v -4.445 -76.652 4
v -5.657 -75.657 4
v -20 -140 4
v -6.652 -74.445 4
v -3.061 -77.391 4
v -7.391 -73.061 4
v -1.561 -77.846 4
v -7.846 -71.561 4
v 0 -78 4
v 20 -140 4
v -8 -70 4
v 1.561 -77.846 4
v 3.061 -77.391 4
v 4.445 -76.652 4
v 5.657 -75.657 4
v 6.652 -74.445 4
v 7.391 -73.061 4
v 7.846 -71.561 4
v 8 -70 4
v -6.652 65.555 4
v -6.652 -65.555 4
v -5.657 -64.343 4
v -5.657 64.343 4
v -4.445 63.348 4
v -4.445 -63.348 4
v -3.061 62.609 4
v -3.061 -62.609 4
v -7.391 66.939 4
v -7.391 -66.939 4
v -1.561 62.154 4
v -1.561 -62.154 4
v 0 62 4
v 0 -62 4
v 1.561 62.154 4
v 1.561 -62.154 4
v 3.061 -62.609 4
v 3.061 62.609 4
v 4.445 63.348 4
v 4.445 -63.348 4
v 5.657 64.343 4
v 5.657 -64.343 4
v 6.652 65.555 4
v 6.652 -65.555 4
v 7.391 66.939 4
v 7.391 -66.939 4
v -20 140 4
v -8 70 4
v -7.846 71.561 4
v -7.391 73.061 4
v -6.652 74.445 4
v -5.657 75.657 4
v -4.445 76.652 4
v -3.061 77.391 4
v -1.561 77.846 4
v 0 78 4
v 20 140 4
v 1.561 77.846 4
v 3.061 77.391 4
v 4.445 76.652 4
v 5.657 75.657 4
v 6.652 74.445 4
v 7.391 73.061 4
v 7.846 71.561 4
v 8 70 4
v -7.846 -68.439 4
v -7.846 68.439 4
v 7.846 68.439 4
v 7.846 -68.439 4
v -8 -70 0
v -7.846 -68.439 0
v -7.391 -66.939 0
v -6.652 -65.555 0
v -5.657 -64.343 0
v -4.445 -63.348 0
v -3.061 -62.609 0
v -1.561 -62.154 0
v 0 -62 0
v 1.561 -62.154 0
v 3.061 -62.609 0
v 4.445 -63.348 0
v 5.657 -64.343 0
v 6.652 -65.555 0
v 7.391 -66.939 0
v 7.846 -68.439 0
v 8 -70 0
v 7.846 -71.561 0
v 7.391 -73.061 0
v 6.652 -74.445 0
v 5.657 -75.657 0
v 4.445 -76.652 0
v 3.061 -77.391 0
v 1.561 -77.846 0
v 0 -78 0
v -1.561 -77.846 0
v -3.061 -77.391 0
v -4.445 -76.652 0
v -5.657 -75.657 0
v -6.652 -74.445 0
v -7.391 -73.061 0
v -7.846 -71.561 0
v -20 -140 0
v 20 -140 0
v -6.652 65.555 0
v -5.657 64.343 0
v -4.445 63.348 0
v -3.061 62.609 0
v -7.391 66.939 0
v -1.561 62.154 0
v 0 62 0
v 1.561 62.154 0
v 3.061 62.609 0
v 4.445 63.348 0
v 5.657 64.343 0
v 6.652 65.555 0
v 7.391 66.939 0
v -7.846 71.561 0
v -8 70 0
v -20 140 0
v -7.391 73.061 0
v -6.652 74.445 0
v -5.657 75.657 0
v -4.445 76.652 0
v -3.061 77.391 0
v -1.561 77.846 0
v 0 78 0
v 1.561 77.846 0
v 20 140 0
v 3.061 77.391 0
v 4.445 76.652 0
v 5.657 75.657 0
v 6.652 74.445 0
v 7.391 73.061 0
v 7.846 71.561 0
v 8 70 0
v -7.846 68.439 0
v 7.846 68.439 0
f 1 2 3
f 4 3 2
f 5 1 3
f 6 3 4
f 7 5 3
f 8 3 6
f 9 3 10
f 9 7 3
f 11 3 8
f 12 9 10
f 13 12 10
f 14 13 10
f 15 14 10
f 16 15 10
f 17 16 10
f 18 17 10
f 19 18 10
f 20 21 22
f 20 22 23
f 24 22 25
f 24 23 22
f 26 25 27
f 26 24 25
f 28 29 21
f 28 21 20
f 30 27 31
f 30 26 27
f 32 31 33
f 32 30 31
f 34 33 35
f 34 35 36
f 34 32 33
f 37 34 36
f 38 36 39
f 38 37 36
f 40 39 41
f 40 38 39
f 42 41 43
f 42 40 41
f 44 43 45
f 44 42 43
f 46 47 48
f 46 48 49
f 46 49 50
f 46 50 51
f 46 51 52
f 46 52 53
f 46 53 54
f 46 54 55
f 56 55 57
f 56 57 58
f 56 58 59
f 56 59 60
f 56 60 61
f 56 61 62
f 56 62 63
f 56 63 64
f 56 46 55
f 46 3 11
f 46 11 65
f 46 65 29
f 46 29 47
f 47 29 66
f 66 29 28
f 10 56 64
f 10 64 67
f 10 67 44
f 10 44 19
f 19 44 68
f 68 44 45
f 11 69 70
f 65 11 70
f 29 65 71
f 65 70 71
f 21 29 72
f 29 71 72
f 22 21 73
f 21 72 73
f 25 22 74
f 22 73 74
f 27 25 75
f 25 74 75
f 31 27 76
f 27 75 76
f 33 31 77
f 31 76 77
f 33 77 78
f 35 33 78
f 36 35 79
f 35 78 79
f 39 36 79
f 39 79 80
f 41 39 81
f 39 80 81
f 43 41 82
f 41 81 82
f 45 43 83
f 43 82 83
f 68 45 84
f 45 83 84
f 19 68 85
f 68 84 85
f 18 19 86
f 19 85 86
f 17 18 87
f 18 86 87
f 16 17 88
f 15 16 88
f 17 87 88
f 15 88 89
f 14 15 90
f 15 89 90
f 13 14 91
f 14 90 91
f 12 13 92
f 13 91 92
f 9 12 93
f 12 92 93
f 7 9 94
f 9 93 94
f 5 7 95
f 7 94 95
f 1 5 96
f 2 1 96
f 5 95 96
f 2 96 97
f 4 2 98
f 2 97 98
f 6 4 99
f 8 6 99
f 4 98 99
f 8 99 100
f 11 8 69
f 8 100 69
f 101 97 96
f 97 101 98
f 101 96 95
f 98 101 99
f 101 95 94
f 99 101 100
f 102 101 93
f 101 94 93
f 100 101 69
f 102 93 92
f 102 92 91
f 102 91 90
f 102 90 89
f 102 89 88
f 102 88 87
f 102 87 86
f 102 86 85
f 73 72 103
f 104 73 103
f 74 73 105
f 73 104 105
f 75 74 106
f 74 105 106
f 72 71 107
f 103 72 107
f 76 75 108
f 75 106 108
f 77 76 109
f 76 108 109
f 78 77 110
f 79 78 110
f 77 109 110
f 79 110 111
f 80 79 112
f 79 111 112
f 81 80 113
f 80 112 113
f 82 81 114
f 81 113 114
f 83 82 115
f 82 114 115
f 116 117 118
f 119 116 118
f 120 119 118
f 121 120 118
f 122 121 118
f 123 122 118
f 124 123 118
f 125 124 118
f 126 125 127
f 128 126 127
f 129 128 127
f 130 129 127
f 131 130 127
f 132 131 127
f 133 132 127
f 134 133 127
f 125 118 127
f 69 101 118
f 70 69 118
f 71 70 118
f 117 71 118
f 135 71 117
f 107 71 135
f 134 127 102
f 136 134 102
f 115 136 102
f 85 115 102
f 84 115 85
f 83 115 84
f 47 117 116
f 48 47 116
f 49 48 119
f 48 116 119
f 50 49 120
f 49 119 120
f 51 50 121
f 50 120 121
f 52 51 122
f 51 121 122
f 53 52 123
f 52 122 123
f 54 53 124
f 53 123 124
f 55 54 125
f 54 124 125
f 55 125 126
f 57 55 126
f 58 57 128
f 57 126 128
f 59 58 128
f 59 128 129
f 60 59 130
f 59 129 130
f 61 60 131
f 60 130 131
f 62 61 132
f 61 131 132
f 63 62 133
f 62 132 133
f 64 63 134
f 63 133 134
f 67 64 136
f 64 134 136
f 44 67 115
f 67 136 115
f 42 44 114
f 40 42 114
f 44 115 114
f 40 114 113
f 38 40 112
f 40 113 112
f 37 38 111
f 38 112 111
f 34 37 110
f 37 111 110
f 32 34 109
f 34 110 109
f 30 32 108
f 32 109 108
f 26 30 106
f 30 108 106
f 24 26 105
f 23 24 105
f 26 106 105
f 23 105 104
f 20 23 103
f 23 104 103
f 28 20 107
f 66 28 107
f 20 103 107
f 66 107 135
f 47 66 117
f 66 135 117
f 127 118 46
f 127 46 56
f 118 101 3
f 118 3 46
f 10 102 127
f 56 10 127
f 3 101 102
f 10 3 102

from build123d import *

# Parameters (mm, degrees)
SKETCH1_W           = 40
SKETCH1_H           = 280
BOSS_EXTRUDE1_DEPTH = 4
SKETCH3_R           = 8
BOSS_EXTRUDE2_DEPTH = 4
SKETCH3_2_R         = 8
CUT_EXTRUDE1_DEPTH  = 4


with BuildPart() as part:
    # Sketch1 → Boss-Extrude1 (new body)
    with BuildSketch(Plane.XY):
        Rectangle(SKETCH1_W, SKETCH1_H)
    extrude(amount=BOSS_EXTRUDE1_DEPTH)

    # Sketch3 → Boss-Extrude2 (add)
    with BuildSketch(Plane(origin=(0, 0, 0), x_dir=(-1, 0, 0), z_dir=(0, 0, -1))):
        with Locations((0, 70)):
            Circle(SKETCH3_R)
        with Locations((0, -70)):
            Circle(SKETCH3_R)
    extrude(amount=-BOSS_EXTRUDE2_DEPTH)

    # Sketch3<2> → Cut-Extrude1 (cut)
    with BuildSketch(Plane(origin=(0, 0, 0), x_dir=(-1, 0, 0), z_dir=(0, 0, -1))):
        with Locations((0, 70)):
            Circle(SKETCH3_2_R)
        with Locations((0, -70)):
            Circle(SKETCH3_2_R)
    extrude(amount=-CUT_EXTRUDE1_DEPTH, mode=Mode.SUBTRACT)


solid = part.part
